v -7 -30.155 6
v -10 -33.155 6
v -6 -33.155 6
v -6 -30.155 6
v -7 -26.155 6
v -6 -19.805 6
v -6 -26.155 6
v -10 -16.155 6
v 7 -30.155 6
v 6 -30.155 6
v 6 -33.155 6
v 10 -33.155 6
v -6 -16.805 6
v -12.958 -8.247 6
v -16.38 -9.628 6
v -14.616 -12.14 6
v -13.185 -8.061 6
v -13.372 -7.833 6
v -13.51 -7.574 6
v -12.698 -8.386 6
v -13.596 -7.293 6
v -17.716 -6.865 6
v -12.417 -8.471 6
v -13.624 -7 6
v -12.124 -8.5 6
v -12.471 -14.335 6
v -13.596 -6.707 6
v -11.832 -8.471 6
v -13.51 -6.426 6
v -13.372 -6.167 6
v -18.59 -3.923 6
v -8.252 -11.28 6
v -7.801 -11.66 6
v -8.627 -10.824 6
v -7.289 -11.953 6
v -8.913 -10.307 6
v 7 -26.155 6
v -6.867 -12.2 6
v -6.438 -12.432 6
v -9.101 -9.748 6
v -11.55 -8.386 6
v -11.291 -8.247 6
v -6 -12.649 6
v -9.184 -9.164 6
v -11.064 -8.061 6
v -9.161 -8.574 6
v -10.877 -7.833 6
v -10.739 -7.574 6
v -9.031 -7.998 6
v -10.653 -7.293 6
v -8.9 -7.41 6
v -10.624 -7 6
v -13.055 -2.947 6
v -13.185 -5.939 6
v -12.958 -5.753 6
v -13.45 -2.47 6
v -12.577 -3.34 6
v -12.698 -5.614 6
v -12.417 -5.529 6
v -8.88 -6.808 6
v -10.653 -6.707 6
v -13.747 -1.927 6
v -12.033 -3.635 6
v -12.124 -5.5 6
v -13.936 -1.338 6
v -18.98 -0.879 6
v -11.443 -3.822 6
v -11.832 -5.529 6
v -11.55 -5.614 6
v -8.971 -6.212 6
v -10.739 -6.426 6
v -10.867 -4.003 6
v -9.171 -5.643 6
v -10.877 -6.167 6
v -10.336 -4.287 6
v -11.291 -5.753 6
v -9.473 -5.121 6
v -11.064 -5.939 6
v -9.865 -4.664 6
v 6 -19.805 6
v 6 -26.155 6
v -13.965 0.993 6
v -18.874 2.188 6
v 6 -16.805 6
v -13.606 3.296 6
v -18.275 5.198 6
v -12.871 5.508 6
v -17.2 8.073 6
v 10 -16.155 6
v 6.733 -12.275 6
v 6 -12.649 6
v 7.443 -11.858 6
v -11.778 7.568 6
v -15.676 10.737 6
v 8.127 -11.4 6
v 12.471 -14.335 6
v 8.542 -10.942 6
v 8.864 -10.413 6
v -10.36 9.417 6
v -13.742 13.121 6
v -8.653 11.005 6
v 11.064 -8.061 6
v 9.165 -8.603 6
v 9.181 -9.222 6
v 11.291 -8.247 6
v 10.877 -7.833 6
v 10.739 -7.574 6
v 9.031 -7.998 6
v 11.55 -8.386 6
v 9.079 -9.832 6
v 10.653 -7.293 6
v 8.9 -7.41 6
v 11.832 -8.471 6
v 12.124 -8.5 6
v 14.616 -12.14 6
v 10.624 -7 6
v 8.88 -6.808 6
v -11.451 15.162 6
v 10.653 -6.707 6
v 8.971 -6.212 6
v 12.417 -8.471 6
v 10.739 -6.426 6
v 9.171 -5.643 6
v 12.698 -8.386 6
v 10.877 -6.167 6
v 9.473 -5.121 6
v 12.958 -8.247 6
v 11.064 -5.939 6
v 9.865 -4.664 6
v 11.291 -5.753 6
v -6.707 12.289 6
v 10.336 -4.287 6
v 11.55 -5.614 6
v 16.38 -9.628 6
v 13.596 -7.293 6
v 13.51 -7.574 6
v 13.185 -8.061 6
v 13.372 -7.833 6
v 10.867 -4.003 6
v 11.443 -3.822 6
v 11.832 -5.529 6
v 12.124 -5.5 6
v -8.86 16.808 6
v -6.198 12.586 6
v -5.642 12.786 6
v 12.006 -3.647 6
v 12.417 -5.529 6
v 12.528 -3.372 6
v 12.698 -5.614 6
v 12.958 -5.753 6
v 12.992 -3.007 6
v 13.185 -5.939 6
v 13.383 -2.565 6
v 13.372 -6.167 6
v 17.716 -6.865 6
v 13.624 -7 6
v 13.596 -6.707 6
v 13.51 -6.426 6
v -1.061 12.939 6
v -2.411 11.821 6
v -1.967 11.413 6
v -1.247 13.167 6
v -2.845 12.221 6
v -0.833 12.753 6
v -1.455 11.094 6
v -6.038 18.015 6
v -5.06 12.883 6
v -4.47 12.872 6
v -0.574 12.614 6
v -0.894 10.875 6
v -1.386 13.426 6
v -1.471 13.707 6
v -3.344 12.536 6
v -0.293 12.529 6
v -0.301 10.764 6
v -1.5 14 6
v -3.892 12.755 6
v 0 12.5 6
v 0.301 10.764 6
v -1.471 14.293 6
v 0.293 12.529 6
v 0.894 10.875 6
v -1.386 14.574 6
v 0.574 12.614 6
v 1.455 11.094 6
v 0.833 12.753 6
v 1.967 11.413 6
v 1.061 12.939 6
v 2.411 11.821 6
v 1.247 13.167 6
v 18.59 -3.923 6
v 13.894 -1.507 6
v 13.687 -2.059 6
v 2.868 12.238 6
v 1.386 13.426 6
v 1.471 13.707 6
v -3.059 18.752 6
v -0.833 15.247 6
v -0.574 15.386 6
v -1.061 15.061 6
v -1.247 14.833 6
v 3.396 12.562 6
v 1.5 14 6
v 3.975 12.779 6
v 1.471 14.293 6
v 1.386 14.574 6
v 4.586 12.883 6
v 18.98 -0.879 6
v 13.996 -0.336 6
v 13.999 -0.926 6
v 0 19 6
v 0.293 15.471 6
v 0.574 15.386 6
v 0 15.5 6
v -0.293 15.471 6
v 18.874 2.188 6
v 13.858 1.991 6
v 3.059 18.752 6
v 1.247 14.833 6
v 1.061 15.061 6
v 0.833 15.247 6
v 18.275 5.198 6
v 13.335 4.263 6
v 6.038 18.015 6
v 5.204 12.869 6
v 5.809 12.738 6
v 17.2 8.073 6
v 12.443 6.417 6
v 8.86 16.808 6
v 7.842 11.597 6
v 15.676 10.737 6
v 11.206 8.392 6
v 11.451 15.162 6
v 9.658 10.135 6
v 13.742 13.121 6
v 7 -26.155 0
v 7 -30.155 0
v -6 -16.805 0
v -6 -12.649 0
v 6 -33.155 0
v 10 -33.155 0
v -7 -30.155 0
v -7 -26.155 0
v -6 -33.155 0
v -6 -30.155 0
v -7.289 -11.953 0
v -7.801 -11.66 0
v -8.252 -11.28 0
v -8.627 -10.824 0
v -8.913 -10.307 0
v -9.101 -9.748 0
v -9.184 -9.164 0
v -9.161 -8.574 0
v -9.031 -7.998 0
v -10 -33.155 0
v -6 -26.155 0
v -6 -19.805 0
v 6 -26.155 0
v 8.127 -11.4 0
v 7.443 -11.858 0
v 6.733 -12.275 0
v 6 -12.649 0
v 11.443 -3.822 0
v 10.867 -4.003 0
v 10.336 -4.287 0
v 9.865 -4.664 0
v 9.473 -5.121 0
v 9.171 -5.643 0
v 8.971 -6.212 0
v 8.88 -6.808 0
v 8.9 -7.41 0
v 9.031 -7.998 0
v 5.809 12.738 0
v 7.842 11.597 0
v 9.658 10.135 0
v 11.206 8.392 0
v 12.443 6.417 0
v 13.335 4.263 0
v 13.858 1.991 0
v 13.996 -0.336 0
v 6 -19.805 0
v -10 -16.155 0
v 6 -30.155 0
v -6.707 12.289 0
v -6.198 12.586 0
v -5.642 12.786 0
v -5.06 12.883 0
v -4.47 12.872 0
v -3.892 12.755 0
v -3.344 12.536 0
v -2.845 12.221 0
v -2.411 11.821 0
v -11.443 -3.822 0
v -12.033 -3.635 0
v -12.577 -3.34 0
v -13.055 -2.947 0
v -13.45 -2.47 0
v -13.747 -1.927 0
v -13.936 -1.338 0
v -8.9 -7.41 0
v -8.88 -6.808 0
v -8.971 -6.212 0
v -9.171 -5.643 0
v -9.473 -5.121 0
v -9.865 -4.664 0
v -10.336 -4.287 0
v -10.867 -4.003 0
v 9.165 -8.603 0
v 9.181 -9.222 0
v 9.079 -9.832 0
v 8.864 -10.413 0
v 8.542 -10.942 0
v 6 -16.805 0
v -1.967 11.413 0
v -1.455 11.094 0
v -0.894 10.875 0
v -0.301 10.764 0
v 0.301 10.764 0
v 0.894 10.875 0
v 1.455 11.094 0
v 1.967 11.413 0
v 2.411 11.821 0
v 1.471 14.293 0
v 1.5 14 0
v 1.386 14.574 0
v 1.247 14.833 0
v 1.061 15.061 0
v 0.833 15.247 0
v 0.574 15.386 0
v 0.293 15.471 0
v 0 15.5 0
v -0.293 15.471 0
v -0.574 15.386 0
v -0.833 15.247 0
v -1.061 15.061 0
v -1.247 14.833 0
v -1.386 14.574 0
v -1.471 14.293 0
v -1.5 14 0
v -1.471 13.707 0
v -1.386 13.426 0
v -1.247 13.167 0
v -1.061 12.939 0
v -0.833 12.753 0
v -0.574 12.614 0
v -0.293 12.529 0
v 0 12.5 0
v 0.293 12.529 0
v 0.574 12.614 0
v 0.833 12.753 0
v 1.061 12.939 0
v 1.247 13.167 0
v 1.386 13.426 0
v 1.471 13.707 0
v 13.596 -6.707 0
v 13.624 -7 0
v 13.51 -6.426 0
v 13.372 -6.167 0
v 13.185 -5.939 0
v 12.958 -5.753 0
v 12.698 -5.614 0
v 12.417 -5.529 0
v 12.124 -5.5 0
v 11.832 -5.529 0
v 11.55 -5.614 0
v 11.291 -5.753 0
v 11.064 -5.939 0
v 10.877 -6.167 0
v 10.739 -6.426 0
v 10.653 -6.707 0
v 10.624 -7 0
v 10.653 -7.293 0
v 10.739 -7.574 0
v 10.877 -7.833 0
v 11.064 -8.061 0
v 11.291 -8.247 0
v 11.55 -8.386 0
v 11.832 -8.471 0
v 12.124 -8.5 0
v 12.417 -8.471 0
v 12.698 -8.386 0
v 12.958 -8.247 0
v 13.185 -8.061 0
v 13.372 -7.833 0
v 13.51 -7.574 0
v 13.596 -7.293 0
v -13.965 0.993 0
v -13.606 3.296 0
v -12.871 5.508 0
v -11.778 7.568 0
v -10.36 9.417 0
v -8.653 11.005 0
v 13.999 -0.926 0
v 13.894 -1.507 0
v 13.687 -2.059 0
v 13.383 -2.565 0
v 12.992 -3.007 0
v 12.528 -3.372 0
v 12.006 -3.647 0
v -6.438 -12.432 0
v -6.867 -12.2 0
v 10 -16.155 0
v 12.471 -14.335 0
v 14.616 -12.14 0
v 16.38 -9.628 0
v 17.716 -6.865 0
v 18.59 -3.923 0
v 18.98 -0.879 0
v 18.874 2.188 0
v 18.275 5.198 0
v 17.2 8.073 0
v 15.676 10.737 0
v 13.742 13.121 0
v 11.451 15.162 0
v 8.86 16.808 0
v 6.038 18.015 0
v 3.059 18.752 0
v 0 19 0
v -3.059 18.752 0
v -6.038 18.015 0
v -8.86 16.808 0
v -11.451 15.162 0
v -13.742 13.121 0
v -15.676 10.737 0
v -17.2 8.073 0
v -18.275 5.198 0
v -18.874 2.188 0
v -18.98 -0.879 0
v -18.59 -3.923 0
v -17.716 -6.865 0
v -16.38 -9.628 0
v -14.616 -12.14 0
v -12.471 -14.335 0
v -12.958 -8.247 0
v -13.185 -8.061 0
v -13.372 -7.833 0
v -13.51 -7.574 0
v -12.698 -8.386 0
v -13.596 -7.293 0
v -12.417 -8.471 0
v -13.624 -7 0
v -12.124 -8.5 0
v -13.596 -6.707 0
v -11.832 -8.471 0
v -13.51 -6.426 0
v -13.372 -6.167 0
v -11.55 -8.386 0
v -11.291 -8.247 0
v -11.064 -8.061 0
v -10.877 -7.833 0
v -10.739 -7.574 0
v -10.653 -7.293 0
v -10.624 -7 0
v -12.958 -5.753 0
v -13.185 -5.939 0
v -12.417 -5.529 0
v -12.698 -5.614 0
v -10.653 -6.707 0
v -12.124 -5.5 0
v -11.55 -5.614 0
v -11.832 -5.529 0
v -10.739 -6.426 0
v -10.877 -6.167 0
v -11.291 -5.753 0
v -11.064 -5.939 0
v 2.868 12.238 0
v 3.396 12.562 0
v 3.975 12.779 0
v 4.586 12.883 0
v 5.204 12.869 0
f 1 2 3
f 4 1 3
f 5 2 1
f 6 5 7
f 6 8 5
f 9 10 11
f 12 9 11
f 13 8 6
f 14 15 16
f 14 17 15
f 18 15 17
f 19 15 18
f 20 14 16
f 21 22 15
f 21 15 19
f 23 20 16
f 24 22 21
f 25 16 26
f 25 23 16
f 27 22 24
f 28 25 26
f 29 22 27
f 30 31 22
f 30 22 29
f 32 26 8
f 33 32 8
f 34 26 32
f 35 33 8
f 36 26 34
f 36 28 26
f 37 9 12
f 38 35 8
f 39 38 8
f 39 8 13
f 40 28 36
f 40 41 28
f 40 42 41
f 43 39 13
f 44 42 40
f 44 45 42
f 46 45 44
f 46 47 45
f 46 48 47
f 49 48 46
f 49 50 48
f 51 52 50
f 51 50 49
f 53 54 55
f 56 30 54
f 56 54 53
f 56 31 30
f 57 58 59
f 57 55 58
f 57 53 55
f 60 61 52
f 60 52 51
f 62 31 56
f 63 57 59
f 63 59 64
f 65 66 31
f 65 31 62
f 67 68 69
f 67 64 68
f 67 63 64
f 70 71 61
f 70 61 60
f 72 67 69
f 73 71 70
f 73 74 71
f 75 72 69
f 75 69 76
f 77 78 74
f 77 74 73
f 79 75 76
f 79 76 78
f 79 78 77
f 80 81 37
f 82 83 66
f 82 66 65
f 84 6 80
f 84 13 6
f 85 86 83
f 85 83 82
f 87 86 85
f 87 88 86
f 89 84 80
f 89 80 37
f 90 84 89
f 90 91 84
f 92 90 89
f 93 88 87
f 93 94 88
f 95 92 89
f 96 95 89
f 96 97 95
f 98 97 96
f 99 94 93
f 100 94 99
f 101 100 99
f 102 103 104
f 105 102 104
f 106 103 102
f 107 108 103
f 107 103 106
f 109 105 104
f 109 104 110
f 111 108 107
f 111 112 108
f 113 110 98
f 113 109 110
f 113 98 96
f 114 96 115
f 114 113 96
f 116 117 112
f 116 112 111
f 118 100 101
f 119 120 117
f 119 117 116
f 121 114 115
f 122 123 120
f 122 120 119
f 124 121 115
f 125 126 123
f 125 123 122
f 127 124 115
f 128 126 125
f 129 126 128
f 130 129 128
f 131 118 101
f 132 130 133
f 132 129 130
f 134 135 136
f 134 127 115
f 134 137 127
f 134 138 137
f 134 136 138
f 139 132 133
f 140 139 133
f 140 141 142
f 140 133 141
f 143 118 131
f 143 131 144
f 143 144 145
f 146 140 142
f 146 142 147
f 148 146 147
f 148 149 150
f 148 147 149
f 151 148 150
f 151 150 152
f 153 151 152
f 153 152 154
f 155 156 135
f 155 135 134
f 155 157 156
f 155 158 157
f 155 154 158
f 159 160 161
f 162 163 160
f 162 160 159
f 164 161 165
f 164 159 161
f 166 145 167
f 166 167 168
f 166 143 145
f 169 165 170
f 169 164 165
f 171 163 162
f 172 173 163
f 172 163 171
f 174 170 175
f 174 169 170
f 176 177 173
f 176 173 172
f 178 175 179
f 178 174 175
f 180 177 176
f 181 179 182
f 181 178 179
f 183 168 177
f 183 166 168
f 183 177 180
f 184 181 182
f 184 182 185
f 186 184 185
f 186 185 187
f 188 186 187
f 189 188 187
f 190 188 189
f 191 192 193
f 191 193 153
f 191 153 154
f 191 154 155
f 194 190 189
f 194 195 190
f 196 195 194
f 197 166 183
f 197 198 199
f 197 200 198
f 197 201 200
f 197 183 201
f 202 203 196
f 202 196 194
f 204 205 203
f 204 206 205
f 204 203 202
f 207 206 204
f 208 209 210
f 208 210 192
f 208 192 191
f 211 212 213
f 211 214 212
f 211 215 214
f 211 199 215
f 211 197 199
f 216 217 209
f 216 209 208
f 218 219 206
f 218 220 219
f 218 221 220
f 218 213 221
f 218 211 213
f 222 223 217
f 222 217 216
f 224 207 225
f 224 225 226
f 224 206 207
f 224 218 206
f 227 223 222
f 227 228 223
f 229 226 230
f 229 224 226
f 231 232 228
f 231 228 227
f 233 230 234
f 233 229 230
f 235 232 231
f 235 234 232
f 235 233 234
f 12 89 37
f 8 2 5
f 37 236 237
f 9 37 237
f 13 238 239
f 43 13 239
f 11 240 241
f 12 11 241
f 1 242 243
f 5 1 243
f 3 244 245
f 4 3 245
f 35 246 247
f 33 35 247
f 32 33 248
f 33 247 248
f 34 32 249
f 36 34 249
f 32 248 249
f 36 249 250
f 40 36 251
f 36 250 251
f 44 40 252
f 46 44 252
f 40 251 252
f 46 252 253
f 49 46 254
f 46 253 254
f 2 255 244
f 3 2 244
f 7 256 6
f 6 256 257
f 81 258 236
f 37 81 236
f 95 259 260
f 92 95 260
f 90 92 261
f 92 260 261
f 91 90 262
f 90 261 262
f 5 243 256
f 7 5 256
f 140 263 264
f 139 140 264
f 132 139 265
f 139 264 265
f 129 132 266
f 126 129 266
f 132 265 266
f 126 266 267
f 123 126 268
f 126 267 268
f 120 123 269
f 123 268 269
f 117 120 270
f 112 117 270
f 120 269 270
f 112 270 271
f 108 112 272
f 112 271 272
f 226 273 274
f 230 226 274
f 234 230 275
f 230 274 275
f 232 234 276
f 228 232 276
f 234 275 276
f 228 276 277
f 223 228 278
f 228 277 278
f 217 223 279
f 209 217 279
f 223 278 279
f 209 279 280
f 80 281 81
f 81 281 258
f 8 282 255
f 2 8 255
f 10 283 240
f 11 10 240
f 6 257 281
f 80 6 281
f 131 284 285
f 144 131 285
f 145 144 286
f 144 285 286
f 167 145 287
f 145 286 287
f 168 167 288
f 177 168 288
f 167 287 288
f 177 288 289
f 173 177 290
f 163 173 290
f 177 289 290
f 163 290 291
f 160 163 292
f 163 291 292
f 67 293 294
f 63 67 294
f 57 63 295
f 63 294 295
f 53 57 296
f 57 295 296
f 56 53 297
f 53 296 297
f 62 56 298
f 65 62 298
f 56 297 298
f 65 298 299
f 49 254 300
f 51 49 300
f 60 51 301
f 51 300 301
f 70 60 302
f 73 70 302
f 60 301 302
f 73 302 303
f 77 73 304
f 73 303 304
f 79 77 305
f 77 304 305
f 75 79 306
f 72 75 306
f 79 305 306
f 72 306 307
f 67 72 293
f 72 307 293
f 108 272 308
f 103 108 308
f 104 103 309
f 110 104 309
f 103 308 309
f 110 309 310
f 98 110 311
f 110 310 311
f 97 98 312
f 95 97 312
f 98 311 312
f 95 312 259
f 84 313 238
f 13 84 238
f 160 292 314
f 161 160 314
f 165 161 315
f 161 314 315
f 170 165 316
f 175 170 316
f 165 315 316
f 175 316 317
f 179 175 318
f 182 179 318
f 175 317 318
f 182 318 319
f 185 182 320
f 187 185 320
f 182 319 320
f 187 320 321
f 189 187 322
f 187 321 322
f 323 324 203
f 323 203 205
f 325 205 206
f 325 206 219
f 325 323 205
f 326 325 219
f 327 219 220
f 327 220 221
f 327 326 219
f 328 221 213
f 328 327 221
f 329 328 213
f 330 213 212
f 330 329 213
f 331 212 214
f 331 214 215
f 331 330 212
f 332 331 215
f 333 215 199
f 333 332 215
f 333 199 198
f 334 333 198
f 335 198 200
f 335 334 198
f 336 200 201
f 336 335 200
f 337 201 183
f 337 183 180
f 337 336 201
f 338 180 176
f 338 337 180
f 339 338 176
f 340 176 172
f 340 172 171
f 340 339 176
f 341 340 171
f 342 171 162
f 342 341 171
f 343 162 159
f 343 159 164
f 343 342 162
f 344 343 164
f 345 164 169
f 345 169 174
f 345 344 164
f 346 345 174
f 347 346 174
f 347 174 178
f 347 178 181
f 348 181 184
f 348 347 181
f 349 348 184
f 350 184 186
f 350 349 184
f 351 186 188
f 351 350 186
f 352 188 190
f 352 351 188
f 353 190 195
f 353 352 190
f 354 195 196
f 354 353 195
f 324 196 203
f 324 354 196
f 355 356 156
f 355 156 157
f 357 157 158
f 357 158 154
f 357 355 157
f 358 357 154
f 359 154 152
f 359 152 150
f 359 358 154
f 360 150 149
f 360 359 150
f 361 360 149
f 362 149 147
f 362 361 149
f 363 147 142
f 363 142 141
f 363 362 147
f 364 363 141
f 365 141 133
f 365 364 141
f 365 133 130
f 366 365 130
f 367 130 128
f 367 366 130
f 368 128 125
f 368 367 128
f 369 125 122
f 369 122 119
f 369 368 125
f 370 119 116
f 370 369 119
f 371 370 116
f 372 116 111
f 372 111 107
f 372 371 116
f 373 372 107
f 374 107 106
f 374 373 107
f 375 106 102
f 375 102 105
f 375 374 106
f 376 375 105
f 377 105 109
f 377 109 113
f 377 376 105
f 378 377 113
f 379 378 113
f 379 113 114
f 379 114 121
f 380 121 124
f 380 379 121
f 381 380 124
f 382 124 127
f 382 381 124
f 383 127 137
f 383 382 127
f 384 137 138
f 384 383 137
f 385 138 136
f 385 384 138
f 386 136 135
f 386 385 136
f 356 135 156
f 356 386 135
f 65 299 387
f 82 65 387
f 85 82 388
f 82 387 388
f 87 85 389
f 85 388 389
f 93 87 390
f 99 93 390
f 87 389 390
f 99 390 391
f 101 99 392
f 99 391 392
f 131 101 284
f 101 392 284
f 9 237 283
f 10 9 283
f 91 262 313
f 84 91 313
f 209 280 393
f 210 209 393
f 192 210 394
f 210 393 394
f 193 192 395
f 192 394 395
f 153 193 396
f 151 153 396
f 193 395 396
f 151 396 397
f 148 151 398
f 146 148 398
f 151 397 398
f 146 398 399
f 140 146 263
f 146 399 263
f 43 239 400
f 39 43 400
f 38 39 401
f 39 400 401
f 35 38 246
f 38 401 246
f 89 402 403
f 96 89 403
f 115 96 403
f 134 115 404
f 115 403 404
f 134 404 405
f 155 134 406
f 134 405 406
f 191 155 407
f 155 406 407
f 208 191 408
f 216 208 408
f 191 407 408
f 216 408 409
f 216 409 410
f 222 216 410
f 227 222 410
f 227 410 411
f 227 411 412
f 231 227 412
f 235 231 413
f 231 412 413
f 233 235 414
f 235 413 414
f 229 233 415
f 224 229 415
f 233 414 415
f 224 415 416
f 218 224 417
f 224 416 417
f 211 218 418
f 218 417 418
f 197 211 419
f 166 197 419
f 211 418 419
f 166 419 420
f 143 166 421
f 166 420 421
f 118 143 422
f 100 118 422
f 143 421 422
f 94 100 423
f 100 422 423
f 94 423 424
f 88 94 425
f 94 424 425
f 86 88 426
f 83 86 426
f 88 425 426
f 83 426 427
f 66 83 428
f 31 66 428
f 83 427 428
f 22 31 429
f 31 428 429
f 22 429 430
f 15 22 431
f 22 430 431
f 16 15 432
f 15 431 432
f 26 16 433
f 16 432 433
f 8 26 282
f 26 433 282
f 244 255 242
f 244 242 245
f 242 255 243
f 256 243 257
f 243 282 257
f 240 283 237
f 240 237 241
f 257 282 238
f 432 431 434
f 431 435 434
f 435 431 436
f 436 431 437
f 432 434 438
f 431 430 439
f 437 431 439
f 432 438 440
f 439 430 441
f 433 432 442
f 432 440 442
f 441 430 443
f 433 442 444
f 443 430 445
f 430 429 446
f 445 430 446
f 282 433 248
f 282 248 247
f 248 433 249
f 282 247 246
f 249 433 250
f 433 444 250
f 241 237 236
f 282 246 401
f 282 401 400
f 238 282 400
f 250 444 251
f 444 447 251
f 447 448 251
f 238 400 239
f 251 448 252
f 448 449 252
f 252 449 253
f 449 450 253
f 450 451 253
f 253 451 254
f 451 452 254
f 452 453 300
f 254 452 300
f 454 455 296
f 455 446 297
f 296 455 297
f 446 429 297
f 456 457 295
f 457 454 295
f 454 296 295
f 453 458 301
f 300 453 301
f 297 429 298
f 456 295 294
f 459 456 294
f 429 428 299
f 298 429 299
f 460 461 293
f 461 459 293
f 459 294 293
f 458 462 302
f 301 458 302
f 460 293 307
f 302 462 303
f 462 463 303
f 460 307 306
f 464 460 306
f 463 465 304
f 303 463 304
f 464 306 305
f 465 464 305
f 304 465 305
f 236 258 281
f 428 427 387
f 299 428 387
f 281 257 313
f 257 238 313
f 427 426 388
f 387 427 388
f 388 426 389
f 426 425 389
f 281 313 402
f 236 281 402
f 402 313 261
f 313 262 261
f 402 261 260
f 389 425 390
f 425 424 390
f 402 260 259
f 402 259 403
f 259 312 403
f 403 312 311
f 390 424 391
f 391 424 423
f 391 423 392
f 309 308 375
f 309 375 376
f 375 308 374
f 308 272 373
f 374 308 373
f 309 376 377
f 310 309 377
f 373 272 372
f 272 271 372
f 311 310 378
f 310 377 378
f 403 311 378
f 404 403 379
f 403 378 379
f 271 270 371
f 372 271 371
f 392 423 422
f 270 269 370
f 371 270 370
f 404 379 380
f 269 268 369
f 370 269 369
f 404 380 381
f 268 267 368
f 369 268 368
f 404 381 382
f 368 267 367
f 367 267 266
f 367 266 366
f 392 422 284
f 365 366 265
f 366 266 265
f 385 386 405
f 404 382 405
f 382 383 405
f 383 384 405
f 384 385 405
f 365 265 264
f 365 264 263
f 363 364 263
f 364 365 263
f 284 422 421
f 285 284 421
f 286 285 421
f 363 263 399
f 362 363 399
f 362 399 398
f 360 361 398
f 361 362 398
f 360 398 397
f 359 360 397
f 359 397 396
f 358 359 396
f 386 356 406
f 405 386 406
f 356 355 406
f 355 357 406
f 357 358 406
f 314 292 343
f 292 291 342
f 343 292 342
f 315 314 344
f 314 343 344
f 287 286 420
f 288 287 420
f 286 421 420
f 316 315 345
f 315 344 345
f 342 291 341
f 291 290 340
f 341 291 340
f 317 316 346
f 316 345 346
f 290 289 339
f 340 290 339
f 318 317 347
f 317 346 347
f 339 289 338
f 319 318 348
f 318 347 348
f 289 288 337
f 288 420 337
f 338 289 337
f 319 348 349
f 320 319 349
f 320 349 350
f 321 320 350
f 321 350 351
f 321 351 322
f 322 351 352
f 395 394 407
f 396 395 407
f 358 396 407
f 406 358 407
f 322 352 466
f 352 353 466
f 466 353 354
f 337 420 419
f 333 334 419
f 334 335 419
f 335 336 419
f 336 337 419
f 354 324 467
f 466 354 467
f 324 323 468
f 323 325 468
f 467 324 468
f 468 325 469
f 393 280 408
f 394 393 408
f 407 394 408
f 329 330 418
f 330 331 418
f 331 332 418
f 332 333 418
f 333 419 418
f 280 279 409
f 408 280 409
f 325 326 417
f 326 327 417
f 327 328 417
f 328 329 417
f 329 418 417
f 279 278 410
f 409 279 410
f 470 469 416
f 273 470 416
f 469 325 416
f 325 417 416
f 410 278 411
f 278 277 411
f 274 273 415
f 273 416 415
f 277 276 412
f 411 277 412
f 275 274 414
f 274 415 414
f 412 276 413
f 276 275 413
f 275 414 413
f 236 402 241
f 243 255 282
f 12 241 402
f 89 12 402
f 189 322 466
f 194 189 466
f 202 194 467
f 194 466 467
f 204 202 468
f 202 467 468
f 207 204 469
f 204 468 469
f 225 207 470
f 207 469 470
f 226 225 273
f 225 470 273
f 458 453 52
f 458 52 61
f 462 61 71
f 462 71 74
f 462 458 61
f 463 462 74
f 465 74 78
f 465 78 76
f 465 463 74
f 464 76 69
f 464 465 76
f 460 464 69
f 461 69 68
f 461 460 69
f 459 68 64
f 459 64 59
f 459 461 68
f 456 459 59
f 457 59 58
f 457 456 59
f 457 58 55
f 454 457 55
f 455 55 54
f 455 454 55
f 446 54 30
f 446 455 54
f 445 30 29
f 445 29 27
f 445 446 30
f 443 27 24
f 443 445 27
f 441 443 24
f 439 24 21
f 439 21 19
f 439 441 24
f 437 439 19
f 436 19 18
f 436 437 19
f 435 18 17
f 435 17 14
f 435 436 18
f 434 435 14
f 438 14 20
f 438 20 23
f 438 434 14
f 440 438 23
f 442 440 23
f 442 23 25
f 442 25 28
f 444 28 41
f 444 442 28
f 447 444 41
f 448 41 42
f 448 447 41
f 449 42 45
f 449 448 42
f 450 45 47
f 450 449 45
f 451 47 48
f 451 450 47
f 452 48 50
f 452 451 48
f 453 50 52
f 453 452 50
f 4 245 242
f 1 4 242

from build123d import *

# Parameters (mm, degrees)
ESQUISSE1_R        = 1.5
BOSS_EXTRU_2_DEPTH = 6


with BuildPart() as part:
    # Esquisse1 → Boss.-Extru.2 (new body)
    with BuildSketch(Plane.XY):
        with BuildLine():
            Line((-6, -33.155494421), (-6, -30.155494421))
            Line((-6, -30.155494421), (-7, -30.155494421))
            Line((-7, -30.155494421), (-7, -26.155494421))
            Line((-7, -26.155494421), (-6, -26.155494421))
            Line((-6, -26.155494421), (-6, -19.805494421))
            Line((-6, -19.805494421), (6, -19.805494421))
            Line((6, -19.805494421), (6, -26.155494421))
            Line((6, -26.155494421), (7, -26.155494421))
            Line((7, -26.155494421), (7, -30.155494421))
            Line((7, -30.155494421), (6, -30.155494421))
            Line((6, -30.155494421), (6, -33.155494421))
            Line((6, -33.155494421), (10, -33.155494421))
            Line((10, -33.155494421), (10, -16.155494421))
            ThreePointArc((10, -16.155494421), (0, 19), (-10, -16.155494421))
            Line((-10, -16.155494421), (-10, -33.155494421))
            Line((-10, -33.155494421), (-6, -33.155494421))
        make_face()
        with Locations((0, 14)):
            Circle(ESQUISSE1_R, mode=Mode.SUBTRACT)
        with Locations((12.124355653, -7)):
            Circle(ESQUISSE1_R, mode=Mode.SUBTRACT)
        with Locations((-12.124355653, -7)):
            Circle(ESQUISSE1_R, mode=Mode.SUBTRACT)
        with BuildLine():
            Line((6, -16.805494421), (-6, -16.805494421))
            Line((-6, -16.805494421), (-6, -12.649110641))
            ThreePointArc((-6, -12.649110641), (-6.653410863, -12.317959405), (-7.288606081, -11.953084179))
            ThreePointArc((-7.288606081, -11.953084179), (-8.912631465, -10.307392628), (-9.031496673, -7.998360322))
            ThreePointArc((-9.031496673, -7.998360322), (-9.309773091, -5.375), (-11.442531564, -3.822325392))
            ThreePointArc((-11.442531564, -3.822325392), (-13.054716827, -2.946828253), (-13.935938611, -1.337764944))
            ThreePointArc((-13.935938611, -1.337764944), (-12.367555464, 6.560760004), (-6.707371512, 12.288660114))
            ThreePointArc((-6.707371512, 12.288660114), (-4.47014813, 12.872261577), (-2.411034891, 11.820685714))
            ThreePointArc((-2.411034891, 11.820685714), (0, 10.75), (2.411034891, 11.820685714))
            ThreePointArc((2.411034891, 11.820685714), (3.975330286, 12.779130538), (5.80943088, 12.737759334))
            ThreePointArc((5.80943088, 12.737759334), (11.865562564, 7.430237213), (13.995977593, -0.335575935))
            ThreePointArc((13.995977593, -0.335575935), (13.382779595, -2.564868949), (11.442531564, -3.822325392))
            ThreePointArc((11.442531564, -3.822325392), (9.309773091, -5.375), (9.031496673, -7.998360322))
            ThreePointArc((9.031496673, -7.998360322), (9.079386541, -9.832302285), (8.126507731, -11.399994391))
            ThreePointArc((8.126507731, -11.399994391), (7.090812931, -12.071469338), (6, -12.649110641))
            Line((6, -12.649110641), (6, -16.805494421))
        make_face(mode=Mode.SUBTRACT)
    extrude(amount=BOSS_EXTRU_2_DEPTH)


solid = part.part
